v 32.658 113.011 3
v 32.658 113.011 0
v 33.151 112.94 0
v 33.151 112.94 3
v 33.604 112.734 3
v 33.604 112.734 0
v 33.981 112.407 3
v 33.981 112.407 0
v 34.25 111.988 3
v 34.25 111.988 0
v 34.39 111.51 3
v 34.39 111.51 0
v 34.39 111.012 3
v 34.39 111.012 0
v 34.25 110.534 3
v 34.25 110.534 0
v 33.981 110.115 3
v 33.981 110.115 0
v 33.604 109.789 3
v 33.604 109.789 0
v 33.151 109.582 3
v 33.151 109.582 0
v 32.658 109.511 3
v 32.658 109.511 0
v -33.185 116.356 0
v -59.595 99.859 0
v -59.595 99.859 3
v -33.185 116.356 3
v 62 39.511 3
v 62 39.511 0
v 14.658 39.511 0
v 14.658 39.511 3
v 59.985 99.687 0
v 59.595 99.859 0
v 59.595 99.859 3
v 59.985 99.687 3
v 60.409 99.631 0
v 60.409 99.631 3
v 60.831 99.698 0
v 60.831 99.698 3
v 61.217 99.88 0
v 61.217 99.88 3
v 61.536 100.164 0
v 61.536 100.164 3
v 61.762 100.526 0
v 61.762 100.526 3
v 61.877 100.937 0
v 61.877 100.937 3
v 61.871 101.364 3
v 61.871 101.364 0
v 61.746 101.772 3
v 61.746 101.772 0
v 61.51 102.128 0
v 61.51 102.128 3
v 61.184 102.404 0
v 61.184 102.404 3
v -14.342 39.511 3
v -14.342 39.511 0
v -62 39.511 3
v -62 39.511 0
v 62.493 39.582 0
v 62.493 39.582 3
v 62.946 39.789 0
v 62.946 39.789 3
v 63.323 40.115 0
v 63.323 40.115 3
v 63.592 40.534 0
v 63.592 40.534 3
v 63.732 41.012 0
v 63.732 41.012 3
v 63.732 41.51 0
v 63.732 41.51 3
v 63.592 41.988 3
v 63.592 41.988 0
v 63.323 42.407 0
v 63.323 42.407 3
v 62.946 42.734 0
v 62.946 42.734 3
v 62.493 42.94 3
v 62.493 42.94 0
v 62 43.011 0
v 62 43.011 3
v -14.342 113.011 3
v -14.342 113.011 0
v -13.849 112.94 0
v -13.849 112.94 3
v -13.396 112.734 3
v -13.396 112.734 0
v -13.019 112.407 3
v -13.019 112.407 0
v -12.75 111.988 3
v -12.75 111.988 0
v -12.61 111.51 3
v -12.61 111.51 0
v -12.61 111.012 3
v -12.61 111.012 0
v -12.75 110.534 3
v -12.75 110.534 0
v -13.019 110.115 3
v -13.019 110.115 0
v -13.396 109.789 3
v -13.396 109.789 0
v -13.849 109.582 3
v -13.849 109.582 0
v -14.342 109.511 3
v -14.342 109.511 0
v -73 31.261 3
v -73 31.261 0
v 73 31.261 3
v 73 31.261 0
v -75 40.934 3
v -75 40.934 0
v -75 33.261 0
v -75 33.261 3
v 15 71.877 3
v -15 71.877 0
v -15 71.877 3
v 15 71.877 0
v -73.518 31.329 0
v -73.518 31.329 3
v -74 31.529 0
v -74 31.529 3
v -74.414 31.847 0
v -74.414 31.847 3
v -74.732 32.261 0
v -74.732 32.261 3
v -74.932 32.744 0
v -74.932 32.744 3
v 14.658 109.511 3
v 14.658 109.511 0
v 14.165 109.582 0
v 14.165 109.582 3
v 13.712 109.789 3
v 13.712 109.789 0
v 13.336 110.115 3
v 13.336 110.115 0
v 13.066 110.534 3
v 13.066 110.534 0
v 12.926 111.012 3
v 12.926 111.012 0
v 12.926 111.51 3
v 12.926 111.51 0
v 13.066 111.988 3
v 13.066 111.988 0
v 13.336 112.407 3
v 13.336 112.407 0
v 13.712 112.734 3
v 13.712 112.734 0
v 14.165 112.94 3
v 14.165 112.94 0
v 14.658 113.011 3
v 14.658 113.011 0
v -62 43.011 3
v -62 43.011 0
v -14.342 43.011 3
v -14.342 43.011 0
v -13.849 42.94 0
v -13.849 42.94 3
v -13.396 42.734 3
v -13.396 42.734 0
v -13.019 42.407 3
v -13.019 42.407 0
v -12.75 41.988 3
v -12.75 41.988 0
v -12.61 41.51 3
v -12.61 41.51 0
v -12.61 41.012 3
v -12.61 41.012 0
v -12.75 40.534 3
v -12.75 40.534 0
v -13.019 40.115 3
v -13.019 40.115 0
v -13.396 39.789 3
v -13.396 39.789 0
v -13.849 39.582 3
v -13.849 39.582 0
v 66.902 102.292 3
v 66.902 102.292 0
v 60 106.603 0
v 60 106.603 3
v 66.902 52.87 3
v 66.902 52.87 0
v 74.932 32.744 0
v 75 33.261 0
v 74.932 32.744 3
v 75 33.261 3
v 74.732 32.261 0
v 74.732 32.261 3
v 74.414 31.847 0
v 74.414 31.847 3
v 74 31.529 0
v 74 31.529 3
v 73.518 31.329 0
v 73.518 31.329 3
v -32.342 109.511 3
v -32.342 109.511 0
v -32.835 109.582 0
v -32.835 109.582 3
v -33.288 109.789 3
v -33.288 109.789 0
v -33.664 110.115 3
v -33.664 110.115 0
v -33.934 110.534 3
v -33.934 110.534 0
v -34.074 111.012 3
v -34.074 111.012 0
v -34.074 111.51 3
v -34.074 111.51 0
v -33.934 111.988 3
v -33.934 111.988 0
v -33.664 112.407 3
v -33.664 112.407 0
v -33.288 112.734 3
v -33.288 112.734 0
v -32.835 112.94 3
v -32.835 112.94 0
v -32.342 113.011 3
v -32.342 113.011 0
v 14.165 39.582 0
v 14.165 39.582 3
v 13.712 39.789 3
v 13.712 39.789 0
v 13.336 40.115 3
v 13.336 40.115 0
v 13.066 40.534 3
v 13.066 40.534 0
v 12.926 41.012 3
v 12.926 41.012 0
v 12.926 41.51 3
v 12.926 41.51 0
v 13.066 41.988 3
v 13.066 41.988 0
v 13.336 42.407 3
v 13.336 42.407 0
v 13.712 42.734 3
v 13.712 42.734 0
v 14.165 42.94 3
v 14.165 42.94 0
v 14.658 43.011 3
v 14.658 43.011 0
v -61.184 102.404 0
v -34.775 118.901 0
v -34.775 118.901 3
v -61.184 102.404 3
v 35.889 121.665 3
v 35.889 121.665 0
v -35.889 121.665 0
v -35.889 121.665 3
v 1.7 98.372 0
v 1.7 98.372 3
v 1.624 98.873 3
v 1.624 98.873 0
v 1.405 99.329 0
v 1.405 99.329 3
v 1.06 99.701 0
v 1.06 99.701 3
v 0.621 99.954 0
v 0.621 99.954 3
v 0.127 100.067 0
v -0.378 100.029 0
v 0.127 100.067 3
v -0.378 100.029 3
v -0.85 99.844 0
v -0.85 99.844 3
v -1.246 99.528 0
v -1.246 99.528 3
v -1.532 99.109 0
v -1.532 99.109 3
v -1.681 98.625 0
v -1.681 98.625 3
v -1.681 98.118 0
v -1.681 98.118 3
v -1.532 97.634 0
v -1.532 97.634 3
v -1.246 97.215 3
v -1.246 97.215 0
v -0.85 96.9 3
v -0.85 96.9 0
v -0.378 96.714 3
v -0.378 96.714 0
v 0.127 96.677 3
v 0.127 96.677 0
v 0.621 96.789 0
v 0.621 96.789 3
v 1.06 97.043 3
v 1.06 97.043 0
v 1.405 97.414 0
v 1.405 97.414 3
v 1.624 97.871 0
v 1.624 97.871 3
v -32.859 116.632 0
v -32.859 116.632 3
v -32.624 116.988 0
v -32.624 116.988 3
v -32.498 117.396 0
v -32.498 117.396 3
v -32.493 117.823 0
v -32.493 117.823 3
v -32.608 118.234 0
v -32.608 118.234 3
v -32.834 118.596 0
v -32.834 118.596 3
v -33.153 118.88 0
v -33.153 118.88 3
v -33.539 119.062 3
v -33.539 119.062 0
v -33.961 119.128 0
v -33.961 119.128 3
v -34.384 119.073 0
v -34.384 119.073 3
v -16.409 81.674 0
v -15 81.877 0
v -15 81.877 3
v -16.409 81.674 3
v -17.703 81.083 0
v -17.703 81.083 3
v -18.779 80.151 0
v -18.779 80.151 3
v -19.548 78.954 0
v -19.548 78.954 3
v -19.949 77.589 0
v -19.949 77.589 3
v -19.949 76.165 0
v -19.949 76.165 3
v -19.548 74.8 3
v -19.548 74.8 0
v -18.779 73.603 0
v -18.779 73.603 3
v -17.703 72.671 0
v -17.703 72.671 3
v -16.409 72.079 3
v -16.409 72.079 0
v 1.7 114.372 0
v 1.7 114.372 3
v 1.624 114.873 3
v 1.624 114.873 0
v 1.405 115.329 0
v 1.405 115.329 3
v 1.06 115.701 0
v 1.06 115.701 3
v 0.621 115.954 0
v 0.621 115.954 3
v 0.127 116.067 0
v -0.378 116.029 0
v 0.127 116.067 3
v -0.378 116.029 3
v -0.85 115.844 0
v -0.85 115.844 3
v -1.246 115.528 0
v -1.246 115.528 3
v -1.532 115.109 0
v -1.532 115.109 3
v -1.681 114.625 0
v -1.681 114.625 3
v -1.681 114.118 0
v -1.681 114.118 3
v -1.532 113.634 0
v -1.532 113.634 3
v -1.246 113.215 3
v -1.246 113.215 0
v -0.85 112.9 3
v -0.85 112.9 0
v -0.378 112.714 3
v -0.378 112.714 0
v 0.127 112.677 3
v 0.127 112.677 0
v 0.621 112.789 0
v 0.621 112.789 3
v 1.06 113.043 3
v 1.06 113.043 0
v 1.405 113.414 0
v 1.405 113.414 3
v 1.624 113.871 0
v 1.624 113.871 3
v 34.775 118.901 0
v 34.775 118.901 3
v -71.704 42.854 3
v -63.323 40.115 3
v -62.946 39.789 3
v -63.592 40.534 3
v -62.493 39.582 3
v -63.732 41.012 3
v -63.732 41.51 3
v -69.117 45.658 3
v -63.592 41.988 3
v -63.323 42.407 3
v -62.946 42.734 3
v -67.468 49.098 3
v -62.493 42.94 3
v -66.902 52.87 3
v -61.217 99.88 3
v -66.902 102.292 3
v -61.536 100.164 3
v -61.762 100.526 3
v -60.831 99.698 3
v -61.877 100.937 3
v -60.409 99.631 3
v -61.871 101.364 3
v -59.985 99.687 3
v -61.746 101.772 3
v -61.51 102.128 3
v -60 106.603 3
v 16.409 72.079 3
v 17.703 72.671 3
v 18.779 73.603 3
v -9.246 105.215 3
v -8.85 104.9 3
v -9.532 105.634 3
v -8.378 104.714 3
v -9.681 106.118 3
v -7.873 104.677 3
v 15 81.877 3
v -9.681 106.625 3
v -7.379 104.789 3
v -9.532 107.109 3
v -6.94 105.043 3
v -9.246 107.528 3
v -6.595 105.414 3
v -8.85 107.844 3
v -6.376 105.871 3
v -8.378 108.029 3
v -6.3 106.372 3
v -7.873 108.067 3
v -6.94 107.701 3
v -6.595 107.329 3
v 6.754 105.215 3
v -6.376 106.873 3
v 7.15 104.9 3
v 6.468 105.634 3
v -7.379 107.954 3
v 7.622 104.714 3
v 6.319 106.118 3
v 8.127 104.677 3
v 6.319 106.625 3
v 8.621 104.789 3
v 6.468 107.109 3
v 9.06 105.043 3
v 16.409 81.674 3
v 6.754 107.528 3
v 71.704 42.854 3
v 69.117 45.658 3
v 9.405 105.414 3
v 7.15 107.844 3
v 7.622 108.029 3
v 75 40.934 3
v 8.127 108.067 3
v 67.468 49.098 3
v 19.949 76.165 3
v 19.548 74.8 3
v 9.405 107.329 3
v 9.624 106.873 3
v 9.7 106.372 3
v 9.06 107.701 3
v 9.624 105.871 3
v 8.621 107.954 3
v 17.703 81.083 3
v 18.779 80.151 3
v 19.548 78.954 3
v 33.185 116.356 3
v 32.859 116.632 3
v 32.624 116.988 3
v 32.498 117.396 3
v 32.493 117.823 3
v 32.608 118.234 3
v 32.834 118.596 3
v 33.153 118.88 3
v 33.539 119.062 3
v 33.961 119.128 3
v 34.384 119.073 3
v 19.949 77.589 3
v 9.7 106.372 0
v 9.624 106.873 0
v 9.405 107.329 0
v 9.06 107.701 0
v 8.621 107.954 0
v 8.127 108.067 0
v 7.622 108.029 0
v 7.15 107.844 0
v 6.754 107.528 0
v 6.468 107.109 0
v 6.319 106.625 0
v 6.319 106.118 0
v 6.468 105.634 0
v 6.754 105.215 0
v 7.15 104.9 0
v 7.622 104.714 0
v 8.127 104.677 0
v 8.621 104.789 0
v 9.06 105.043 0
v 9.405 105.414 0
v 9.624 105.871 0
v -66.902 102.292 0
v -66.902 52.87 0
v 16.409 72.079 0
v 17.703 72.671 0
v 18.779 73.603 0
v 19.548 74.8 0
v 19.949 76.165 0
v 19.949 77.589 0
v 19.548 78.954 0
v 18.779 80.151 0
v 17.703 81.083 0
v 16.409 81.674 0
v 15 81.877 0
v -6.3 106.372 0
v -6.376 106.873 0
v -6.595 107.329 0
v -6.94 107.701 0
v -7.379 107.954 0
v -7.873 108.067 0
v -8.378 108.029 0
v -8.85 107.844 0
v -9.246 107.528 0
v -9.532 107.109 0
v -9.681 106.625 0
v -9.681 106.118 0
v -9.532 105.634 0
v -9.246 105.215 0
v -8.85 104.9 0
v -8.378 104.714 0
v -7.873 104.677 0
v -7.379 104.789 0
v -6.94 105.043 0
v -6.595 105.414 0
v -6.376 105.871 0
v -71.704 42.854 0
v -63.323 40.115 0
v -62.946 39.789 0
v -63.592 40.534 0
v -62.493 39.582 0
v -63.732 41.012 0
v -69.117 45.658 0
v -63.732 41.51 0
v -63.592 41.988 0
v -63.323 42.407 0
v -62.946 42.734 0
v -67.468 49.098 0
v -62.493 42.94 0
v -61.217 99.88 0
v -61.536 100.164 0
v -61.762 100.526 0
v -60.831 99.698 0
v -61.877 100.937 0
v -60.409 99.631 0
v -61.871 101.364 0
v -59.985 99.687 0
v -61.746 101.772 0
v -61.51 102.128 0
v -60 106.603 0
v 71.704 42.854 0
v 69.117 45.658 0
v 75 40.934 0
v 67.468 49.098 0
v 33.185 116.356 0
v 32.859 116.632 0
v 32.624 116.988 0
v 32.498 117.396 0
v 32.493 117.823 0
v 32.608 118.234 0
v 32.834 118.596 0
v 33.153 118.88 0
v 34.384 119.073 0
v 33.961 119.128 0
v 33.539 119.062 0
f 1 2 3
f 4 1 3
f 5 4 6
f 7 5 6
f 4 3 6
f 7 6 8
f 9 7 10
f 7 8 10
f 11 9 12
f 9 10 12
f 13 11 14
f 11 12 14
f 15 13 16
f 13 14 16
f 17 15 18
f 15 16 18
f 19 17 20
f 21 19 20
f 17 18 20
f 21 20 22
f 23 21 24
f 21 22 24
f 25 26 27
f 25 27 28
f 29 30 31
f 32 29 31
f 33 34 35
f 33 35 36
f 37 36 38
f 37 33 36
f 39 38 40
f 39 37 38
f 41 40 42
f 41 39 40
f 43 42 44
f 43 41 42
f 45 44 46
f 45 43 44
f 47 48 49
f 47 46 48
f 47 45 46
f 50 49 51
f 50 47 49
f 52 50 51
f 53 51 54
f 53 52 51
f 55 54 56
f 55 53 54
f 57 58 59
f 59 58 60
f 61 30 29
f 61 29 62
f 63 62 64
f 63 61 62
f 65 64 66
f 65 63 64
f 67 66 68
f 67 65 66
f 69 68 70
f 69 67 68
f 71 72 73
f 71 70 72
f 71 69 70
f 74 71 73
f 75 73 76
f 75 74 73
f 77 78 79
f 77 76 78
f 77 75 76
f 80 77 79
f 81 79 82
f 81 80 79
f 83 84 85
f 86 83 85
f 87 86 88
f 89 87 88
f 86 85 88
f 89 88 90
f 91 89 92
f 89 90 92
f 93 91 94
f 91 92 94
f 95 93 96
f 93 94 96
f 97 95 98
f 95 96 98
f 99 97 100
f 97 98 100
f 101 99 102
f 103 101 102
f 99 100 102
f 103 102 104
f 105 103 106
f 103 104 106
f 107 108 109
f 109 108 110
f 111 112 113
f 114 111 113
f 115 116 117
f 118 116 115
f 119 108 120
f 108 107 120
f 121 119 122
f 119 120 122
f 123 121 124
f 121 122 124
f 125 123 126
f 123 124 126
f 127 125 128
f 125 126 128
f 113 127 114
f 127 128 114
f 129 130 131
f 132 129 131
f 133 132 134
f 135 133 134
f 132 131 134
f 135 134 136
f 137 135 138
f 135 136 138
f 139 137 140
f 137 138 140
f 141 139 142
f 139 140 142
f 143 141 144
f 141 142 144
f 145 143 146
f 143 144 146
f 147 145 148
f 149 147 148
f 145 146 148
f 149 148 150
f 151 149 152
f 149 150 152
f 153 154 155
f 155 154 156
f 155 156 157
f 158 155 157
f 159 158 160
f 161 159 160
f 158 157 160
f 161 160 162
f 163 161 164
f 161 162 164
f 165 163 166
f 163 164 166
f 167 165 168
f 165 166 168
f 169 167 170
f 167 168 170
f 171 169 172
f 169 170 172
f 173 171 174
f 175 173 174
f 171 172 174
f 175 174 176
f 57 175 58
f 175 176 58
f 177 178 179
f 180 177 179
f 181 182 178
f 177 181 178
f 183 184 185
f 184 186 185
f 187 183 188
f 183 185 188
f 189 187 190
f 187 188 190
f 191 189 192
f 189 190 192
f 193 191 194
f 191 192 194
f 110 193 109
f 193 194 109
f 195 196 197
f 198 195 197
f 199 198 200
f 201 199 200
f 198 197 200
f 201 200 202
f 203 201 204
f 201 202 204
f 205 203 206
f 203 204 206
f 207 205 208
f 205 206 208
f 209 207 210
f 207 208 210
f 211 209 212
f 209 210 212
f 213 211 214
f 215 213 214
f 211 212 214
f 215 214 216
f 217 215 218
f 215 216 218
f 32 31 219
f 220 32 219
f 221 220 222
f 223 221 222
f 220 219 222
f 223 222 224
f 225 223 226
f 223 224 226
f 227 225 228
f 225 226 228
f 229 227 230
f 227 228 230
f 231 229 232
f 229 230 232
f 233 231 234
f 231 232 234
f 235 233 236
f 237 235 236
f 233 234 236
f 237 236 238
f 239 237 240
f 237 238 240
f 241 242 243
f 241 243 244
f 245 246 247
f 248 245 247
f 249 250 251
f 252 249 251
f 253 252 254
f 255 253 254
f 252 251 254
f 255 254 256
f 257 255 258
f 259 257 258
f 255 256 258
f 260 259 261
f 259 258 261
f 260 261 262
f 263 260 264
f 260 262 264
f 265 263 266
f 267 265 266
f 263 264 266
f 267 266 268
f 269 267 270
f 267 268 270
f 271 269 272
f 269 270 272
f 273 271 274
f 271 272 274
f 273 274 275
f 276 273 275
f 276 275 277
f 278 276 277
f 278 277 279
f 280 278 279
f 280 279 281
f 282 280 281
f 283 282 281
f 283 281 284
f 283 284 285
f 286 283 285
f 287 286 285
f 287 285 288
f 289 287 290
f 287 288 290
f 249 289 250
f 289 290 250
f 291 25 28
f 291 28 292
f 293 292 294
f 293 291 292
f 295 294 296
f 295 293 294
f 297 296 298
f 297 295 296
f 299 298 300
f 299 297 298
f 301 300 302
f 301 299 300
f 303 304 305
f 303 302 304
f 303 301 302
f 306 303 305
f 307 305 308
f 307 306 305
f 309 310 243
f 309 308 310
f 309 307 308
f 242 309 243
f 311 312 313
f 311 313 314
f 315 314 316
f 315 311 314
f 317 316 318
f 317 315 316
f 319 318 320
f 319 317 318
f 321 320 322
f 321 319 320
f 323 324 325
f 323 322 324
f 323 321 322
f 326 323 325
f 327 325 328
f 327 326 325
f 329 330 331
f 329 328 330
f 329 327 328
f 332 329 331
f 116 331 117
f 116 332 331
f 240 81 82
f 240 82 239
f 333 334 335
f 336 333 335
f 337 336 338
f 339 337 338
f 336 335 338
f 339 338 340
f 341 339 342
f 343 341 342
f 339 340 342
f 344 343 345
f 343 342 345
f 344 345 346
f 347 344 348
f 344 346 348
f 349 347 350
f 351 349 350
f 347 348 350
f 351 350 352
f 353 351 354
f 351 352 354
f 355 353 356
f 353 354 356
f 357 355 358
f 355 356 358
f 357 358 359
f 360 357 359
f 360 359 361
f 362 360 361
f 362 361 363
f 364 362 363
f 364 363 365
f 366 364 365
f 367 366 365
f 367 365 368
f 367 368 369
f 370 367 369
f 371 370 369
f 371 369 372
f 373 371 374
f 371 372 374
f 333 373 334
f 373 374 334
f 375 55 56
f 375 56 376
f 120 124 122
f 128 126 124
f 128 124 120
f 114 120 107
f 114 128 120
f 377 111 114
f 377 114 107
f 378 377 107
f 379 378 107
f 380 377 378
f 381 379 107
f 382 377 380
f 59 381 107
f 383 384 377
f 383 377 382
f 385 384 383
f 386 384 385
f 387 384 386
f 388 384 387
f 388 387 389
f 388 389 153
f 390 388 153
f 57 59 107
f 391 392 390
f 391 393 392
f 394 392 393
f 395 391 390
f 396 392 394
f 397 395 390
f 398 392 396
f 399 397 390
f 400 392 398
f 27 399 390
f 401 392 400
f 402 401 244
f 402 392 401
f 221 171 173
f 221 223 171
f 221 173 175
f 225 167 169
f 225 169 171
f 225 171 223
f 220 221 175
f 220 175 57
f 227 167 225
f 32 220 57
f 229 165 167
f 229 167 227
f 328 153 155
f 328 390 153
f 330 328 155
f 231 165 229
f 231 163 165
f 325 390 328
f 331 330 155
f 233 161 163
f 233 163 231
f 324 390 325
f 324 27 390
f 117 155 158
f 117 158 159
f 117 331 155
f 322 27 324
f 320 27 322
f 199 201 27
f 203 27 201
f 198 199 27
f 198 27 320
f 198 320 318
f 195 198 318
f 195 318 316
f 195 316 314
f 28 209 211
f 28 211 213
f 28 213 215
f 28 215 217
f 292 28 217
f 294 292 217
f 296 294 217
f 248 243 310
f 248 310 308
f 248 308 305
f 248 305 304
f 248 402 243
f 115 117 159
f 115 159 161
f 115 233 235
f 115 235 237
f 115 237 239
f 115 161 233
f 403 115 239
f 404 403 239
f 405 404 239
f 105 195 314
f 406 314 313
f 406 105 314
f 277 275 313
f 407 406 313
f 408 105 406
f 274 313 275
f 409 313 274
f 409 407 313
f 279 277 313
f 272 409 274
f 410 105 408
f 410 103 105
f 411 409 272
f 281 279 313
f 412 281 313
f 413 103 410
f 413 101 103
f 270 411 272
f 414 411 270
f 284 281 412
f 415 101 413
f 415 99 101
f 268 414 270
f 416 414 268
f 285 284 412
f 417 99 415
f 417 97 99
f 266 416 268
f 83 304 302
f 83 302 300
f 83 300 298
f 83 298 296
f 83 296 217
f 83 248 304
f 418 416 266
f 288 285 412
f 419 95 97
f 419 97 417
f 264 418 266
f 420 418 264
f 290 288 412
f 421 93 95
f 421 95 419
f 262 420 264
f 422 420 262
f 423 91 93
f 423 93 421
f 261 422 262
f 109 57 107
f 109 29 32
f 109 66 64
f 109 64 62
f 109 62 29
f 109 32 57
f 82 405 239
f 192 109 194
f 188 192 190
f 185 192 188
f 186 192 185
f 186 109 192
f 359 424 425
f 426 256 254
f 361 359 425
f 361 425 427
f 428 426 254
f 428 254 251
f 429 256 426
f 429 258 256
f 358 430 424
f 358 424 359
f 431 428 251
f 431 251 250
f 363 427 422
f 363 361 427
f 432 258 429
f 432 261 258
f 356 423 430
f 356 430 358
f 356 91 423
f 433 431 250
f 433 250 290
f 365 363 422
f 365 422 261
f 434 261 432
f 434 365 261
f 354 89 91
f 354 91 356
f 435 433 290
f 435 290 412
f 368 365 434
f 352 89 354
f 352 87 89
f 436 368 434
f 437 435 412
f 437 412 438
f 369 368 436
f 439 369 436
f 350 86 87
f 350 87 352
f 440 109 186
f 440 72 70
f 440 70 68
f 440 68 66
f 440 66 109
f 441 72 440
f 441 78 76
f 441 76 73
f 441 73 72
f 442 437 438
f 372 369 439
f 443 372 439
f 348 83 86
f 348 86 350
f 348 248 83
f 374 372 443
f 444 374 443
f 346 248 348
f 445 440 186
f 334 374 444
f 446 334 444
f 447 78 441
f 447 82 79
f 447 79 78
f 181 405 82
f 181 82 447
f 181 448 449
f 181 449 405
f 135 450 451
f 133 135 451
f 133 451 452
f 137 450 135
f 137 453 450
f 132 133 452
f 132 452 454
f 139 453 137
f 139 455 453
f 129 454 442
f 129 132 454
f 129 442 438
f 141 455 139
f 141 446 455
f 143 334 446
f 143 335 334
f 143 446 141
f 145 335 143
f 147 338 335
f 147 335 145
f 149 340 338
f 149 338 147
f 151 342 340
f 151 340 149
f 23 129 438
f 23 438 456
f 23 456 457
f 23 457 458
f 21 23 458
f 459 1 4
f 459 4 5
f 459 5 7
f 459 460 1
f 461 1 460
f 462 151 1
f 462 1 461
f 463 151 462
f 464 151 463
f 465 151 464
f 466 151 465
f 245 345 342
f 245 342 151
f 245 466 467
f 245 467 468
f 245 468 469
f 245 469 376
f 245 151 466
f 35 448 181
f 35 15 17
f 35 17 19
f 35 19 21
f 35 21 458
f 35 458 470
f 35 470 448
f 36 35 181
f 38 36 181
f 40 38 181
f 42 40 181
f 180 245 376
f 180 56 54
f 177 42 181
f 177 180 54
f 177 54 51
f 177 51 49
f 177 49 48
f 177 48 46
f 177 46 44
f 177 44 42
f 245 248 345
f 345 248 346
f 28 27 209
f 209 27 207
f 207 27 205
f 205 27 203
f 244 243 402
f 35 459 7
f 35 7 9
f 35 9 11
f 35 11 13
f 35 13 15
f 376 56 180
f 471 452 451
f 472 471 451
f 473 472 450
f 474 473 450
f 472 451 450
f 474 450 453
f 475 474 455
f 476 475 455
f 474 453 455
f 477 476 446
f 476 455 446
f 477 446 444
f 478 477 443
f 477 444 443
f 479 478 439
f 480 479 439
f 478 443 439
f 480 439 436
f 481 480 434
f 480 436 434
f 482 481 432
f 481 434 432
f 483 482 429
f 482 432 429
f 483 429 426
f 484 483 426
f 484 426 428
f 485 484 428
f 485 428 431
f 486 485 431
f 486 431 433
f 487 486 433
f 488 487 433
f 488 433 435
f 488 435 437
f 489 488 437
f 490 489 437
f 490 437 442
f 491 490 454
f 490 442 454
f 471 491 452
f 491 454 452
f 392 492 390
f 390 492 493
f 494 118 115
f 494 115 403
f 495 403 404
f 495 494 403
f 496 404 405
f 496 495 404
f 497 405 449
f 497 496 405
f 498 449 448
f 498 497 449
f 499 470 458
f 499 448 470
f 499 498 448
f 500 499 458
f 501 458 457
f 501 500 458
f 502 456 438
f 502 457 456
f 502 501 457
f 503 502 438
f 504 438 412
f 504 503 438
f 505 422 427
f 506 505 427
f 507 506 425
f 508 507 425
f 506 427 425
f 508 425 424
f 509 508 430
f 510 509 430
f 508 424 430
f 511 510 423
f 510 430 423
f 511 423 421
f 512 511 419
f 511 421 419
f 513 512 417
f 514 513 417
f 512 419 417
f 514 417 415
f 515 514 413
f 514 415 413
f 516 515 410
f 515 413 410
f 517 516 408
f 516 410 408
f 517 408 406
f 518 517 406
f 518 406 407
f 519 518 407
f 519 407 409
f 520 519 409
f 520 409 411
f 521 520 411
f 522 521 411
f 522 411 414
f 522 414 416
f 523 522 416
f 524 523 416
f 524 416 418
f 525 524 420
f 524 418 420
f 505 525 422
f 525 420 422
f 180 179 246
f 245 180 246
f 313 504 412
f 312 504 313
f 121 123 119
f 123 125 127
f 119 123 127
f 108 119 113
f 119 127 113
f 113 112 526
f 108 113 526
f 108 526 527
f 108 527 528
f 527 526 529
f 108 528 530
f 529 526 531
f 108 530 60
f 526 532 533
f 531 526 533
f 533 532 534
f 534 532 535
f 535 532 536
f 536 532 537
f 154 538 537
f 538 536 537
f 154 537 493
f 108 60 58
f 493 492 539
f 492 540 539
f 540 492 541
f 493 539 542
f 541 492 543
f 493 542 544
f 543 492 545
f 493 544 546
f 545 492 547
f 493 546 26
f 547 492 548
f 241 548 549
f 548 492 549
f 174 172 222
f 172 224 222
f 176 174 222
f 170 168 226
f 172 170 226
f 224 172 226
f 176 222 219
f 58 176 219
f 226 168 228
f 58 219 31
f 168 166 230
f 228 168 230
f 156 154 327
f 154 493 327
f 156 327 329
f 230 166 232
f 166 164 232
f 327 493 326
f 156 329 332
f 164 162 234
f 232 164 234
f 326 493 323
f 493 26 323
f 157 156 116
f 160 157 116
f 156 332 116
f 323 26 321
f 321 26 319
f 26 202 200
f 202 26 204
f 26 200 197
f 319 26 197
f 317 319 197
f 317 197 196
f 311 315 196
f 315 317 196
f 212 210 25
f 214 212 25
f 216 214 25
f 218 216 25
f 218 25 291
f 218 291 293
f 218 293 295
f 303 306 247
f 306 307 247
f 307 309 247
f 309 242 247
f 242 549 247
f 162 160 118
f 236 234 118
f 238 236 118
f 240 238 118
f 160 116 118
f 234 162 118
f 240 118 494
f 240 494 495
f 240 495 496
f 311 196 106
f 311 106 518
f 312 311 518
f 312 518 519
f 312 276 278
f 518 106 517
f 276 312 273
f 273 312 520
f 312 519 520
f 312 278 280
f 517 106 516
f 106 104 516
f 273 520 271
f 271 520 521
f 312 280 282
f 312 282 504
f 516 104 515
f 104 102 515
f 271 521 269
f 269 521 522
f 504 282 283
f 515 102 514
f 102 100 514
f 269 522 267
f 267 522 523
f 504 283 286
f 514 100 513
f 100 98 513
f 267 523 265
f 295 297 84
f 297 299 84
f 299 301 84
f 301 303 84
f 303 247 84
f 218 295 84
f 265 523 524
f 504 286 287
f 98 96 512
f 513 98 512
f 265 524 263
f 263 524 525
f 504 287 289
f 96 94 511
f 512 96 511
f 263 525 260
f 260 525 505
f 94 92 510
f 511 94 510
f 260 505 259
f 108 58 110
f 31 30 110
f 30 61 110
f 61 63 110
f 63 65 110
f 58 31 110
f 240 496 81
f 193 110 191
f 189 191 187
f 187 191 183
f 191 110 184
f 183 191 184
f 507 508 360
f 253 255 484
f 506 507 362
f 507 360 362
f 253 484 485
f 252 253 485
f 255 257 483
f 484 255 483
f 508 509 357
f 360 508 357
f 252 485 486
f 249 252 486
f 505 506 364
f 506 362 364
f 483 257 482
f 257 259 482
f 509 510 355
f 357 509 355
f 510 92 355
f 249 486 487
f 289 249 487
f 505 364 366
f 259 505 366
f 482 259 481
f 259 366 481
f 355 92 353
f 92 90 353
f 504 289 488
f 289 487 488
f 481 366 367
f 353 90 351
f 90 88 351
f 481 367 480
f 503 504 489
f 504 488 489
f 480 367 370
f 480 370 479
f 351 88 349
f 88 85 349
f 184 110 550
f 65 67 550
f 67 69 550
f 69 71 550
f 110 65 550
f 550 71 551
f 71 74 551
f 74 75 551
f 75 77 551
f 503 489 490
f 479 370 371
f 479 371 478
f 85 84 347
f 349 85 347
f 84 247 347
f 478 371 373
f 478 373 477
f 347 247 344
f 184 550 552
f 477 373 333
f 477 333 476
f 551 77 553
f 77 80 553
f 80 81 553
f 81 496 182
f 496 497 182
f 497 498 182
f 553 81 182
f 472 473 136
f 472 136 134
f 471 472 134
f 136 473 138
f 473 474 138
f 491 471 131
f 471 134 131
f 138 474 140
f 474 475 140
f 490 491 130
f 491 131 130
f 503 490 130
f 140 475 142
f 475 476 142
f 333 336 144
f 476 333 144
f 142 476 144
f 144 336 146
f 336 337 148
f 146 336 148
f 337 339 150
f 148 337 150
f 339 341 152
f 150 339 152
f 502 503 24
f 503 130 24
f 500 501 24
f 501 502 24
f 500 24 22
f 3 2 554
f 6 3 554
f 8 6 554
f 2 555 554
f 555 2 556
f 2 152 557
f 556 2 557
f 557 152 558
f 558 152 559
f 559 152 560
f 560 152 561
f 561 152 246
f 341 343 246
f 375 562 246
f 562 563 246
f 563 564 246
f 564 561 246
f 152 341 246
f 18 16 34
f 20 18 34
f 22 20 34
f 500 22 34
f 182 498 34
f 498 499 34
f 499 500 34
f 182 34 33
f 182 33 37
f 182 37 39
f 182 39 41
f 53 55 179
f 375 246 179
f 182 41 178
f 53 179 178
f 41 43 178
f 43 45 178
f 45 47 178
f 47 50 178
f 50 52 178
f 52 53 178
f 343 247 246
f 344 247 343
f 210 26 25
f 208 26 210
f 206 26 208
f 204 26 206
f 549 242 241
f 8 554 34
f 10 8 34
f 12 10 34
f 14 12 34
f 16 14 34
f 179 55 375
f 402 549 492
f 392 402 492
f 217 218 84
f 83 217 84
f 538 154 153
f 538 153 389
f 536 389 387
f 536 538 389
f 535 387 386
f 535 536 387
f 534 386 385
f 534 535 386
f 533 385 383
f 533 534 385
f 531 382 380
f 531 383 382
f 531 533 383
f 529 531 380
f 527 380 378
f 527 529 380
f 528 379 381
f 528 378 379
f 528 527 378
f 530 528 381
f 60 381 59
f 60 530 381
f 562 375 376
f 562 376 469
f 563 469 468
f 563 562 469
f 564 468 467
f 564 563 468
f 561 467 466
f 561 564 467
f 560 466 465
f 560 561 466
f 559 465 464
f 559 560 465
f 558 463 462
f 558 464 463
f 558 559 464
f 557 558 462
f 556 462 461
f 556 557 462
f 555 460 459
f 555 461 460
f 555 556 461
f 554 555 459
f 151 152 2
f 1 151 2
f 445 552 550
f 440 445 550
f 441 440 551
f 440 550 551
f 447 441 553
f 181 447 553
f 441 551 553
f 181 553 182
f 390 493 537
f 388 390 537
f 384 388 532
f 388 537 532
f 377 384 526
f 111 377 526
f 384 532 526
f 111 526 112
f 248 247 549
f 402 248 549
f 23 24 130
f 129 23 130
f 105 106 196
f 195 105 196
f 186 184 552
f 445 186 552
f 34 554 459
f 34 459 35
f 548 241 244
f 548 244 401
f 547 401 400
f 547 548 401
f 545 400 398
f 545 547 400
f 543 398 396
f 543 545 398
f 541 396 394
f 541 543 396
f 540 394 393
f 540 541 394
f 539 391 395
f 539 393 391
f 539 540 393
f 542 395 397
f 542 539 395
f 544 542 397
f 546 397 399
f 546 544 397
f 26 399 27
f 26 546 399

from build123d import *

# Parameters (mm, degrees)
EXTRUDE_1_DEPTH      = 3
SKETCH_7_R           = 1.75
SKETCH_7_R_2         = 2.25
CUT_EXTRUDE_2_DEPTH  = 143.955430949
CUT_EXTRUDE_4_DEPTH  = 3
CUT_EXTRUDE_5_DEPTH  = 3
CUT_EXTRUDE_8_DEPTH  = 3
SKETCH_12_R          = 1.7
CUT_EXTRUDE_9_DEPTH  = 3
SKETCH_13_R          = 1.7
CUT_EXTRUDE_11_DEPTH = 3
CUT_EXTRUDE_12_DEPTH = 143.955430949
FILLET_1_R           = 2
FILLET_2_R           = 2
CUT_EXTRUDE_13_DEPTH = 143.955430949
CUT_EXTRUDE_15_DEPTH = 143.955430949
CUT_EXTRUDE_16_DEPTH = 143.955430949
SKETCH_20_W          = 133.80338819
SKETCH_20_H          = 42.989432067
EXTRUDE_2_DEPTH      = 3
SKETCH_21_W          = 129.207272524
SKETCH_21_H          = 38.788932745
EXTRUDE_3_DEPTH      = 3
SKETCH_22_W          = 20.868569364
SKETCH_22_H          = 31.210515244
SKETCH_22_W_2        = 21.053246969
SKETCH_22_H_2        = 30.102449614
EXTRUDE_4_DEPTH      = 3
SKETCH_24_W          = 36.300662223
SKETCH_24_H          = 5.953308604
SKETCH_24_W_2        = 36.591067521
EXTRUDE_5_DEPTH      = 3
CUT_EXTRUDE_17_DEPTH = 143.955430949
CUT_EXTRUDE_19_DEPTH = 143.955430949
CUT_EXTRUDE_20_DEPTH = 143.955430949
CUT_EXTRUDE_21_DEPTH = 143.955430949
CUT_EXTRUDE_22_DEPTH = 143.955430949
CUT_EXTRUDE_23_DEPTH = 3
SKETCH_30_W          = 173.170170175
SKETCH_30_H          = 150.145671893
CUT_EXTRUDE_24_DEPTH = 10


with BuildPart() as part:
    # 草图1 → 凸台-拉伸1 (new body)
    with BuildSketch(Plane.XY):
        with BuildLine():
            Line((60, 106.603296002), (35.889163634, 121.664519159))
            Line((35.889163634, 121.664519159), (-35.889163634, 121.664519159))
            Line((-35.889163634, 121.664519159), (-60, 106.603296002))
            Line((-60, 106.603296002), (-60, 94.801892265))
            Line((-60, 94.801892265), (-45, 94.801892265))
            ThreePointArc((-45, 94.801892265), (-43.762563133, 94.289329132), (-43.25, 93.051892265))
            Line((-43.25, 93.051892265), (-37.75, 93.051892265))
            ThreePointArc((-37.75, 93.051892265), (-37.237436867, 94.289329132), (-36, 94.801892265))
            Line((-36, 94.801892265), (-21, 94.801892265))
            ThreePointArc((-21, 94.801892265), (-19.762563133, 94.289329132), (-19.25, 93.051892265))
            Line((-19.25, 93.051892265), (19.25, 93.051892265))
            ThreePointArc((19.25, 93.051892265), (19.762563133, 94.289329132), (21, 94.801892265))
            Line((21, 94.801892265), (36, 94.801892265))
            ThreePointArc((36, 94.801892265), (37.237436867, 94.289329132), (37.75, 93.051892265))
            Line((37.75, 93.051892265), (43.25, 93.051892265))
            ThreePointArc((43.25, 93.051892265), (43.762563133, 94.289329132), (45, 94.801892265))
            Line((45, 94.801892265), (60, 94.801892265))
            Line((60, 94.801892265), (60, 106.603296002))
        make_face()
        with BuildLine():
            Line((66.901694095, 102.292041372), (60, 106.603296002))
            Line((60, 106.603296002), (60, 94.801892265))
            ThreePointArc((60, 94.801892265), (61.237436867, 94.289329132), (61.75, 93.051892265))
            Line((61.75, 93.051892265), (66.901694095, 93.051892265))
            Line((66.901694095, 93.051892265), (66.901694095, 102.292041372))
        make_face()
        with BuildLine():
            Line((-60, 94.801892265), (-60, 106.603296002))
            Line((-60, 106.603296002), (-66.901694095, 102.292041372))
            Line((-66.901694095, 102.292041372), (-66.901694095, 93.051892265))
            Line((-66.901694095, 93.051892265), (-61.75, 93.051892265))
            ThreePointArc((-61.75, 93.051892265), (-61.237436867, 94.289329132), (-60, 94.801892265))
        make_face()
        with BuildLine():
            Line((66.901694095, 63.051892265), (66.901694095, 93.051892265))
            Line((66.901694095, 93.051892265), (61.75, 93.051892265))
            ThreePointArc((61.75, 93.051892265), (61.237436867, 91.814455398), (60, 91.301892265))
            Line((60, 91.301892265), (60, 64.801892265))
            ThreePointArc((60, 64.801892265), (61.237436867, 64.289329132), (61.75, 63.051892265))
            Line((61.75, 63.051892265), (66.901694095, 63.051892265))
        make_face()
        with BuildLine():
            Line((-61.75, 93.051892265), (-66.901694095, 93.051892265))
            Line((-66.901694095, 93.051892265), (-66.901694095, 63.051892265))
            Line((-66.901694095, 63.051892265), (-61.75, 63.051892265))
            ThreePointArc((-61.75, 63.051892265), (-61.237436867, 64.289329132), (-60, 64.801892265))
            Line((-60, 64.801892265), (-60, 91.301892265))
            ThreePointArc((-60, 91.301892265), (-61.237436867, 91.814455398), (-61.75, 93.051892265))
        make_face()
        with BuildLine():
            Line((66.901694095, 52.870133869), (66.901694095, 63.051892265))
            Line((66.901694095, 63.051892265), (61.75, 63.051892265))
            ThreePointArc((61.75, 63.051892265), (61.237436867, 61.814455398), (60, 61.301892265))
            Line((60, 61.301892265), (60, 31.261343001))
            Line((60, 31.261343001), (75, 31.261343001))
            Line((75, 31.261343001), (75, 40.933889795))
            ThreePointArc((75, 40.933889795), (69.117351927, 45.658052319), (66.901694095, 52.870133869))
        make_face()
        with BuildLine():
            Line((60, 64.801892265), (60, 91.301892265))
            Line((60, 91.301892265), (45, 91.301892265))
            ThreePointArc((45, 91.301892265), (43.762563133, 91.814455398), (43.25, 93.051892265))
            Line((43.25, 93.051892265), (37.75, 93.051892265))
            ThreePointArc((37.75, 93.051892265), (37.237436867, 91.814455398), (36, 91.301892265))
            Line((36, 91.301892265), (21, 91.301892265))
            ThreePointArc((21, 91.301892265), (19.762563133, 91.814455398), (19.25, 93.051892265))
            Line((19.25, 93.051892265), (-19.25, 93.051892265))
            ThreePointArc((-19.25, 93.051892265), (-19.762563133, 91.814455398), (-21, 91.301892265))
            Line((-21, 91.301892265), (-36, 91.301892265))
            ThreePointArc((-36, 91.301892265), (-37.237436867, 91.814455398), (-37.75, 93.051892265))
            Line((-37.75, 93.051892265), (-43.25, 93.051892265))
            ThreePointArc((-43.25, 93.051892265), (-43.762563133, 91.814455398), (-45, 91.301892265))
            Line((-45, 91.301892265), (-60, 91.301892265))
            Line((-60, 91.301892265), (-60, 64.801892265))
            Line((-60, 64.801892265), (-45, 64.801892265))
            ThreePointArc((-45, 64.801892265), (-43.762563133, 64.289329132), (-43.25, 63.051892265))
            Line((-43.25, 63.051892265), (-37.75, 63.051892265))
            ThreePointArc((-37.75, 63.051892265), (-37.237436867, 64.289329132), (-36, 64.801892265))
            Line((-36, 64.801892265), (-21, 64.801892265))
            ThreePointArc((-21, 64.801892265), (-19.762563133, 64.289329132), (-19.25, 63.051892265))
            Line((-19.25, 63.051892265), (19.25, 63.051892265))
            ThreePointArc((19.25, 63.051892265), (19.762563133, 64.289329132), (21, 64.801892265))
            Line((21, 64.801892265), (36, 64.801892265))
            ThreePointArc((36, 64.801892265), (37.237436867, 64.289329132), (37.75, 63.051892265))
            Line((37.75, 63.051892265), (43.25, 63.051892265))
            ThreePointArc((43.25, 63.051892265), (43.762563133, 64.289329132), (45, 64.801892265))
            Line((45, 64.801892265), (60, 64.801892265))
        make_face()
        with BuildLine():
            Line((-61.75, 63.051892265), (-66.901694095, 63.051892265))
            Line((-66.901694095, 63.051892265), (-66.901694095, 52.870133869))
            ThreePointArc((-66.901694095, 52.870133869), (-69.117351927, 45.658052319), (-75, 40.933889795))
            Line((-75, 40.933889795), (-75, 31.261343001))
            Line((-75, 31.261343001), (-60, 31.261343001))
            Line((-60, 31.261343001), (-60, 61.301892265))
            ThreePointArc((-60, 61.301892265), (-61.237436867, 61.814455398), (-61.75, 63.051892265))
        make_face()
        with BuildLine():
            Line((60, 31.261343001), (60, 61.301892265))
            Line((60, 61.301892265), (45, 61.301892265))
            ThreePointArc((45, 61.301892265), (43.762563133, 61.814455398), (43.25, 63.051892265))
            Line((43.25, 63.051892265), (37.75, 63.051892265))
            ThreePointArc((37.75, 63.051892265), (37.237436867, 61.814455398), (36, 61.301892265))
            Line((36, 61.301892265), (21, 61.301892265))
            ThreePointArc((21, 61.301892265), (19.762563133, 61.814455398), (19.25, 63.051892265))
            Line((19.25, 63.051892265), (-19.25, 63.051892265))
            ThreePointArc((-19.25, 63.051892265), (-19.762563133, 61.814455398), (-21, 61.301892265))
            Line((-21, 61.301892265), (-36, 61.301892265))
            ThreePointArc((-36, 61.301892265), (-37.237436867, 61.814455398), (-37.75, 63.051892265))
            Line((-37.75, 63.051892265), (-43.25, 63.051892265))
            ThreePointArc((-43.25, 63.051892265), (-43.762563133, 61.814455398), (-45, 61.301892265))
            Line((-45, 61.301892265), (-60, 61.301892265))
            Line((-60, 61.301892265), (-60, 31.261343001))
            Line((-60, 31.261343001), (60, 31.261343001))
        make_face()
        with BuildLine():
            Line((60, -58.312864289), (60, 23.940028391))
            Line((60, 23.940028391), (-60, 23.940028391))
            Line((-60, 23.940028391), (-60, -58.312864289))
            Line((-60, -58.312864289), (-45, -58.312864289))
            ThreePointArc((-45, -58.312864289), (-43.25, -60.062864289), (-45, -61.812864289))
            Line((-45, -61.812864289), (-60, -61.812864289))
            Line((-60, -61.812864289), (-60, -88.312864289))
            Line((-60, -88.312864289), (-45, -88.312864289))
            ThreePointArc((-45, -88.312864289), (-43.25, -90.062864289), (-45, -91.812864289))
            Line((-45, -91.812864289), (-60, -91.812864289))
            Line((-60, -91.812864289), (-60, -111.849967256))
            Line((-60, -111.849967256), (-38.845469114, -105.590576733))
            ThreePointArc((-38.845469114, -105.590576733), (-36.037784492, -104.975210108), (-33.17088573, -104.768665882))
            Line((-33.17088573, -104.768665882), (33.17088573, -104.768665882))
            ThreePointArc((33.17088573, -104.768665882), (36.037784492, -104.975210108), (38.845469114, -105.590576733))
            Line((38.845469114, -105.590576733), (60, -111.849967256))
            Line((60, -111.849967256), (60, -91.812864289))
            Line((60, -91.812864289), (45, -91.812864289))
            ThreePointArc((45, -91.812864289), (43.762563133, -91.300301156), (43.25, -90.062864289))
            ThreePointArc((43.25, -90.062864289), (43.762563133, -88.825427422), (45, -88.312864289))
            Line((45, -88.312864289), (60, -88.312864289))
            Line((60, -88.312864289), (60, -61.812864289))
            Line((60, -61.812864289), (45, -61.812864289))
            ThreePointArc((45, -61.812864289), (43.762563133, -61.300301156), (43.25, -60.062864289))
            ThreePointArc((43.25, -60.062864289), (43.762563133, -58.825427422), (45, -58.312864289))
            Line((45, -58.312864289), (60, -58.312864289))
        make_face()
        with BuildLine():
            ThreePointArc((-21, -88.312864289), (-19.762563133, -88.825427422), (-19.25, -90.062864289))
            ThreePointArc((-19.25, -90.062864289), (-19.762563133, -91.300301156), (-21, -91.812864289))
            Line((-21, -91.812864289), (-36, -91.812864289))
            ThreePointArc((-36, -91.812864289), (-37.75, -90.062864289), (-36, -88.312864289))
            Line((-36, -88.312864289), (-21, -88.312864289))
        make_face(mode=Mode.SUBTRACT)
        with BuildLine():
            ThreePointArc((-21, -58.312864289), (-19.762563133, -58.825427422), (-19.25, -60.062864289))
            ThreePointArc((-19.25, -60.062864289), (-19.762563133, -61.300301156), (-21, -61.812864289))
            Line((-21, -61.812864289), (-36, -61.812864289))
            ThreePointArc((-36, -61.812864289), (-37.75, -60.062864289), (-36, -58.312864289))
            Line((-36, -58.312864289), (-21, -58.312864289))
        make_face(mode=Mode.SUBTRACT)
        with BuildLine():
            ThreePointArc((36, -88.312864289), (37.237436867, -88.825427422), (37.75, -90.062864289))
            ThreePointArc((37.75, -90.062864289), (37.237436867, -91.300301156), (36, -91.812864289))
            Line((36, -91.812864289), (21, -91.812864289))
            ThreePointArc((21, -91.812864289), (19.762563133, -91.300301156), (19.25, -90.062864289))
            ThreePointArc((19.25, -90.062864289), (19.762563133, -88.825427422), (21, -88.312864289))
            Line((21, -88.312864289), (36, -88.312864289))
        make_face(mode=Mode.SUBTRACT)
        with BuildLine():
            ThreePointArc((36, -58.312864289), (37.237436867, -58.825427422), (37.75, -60.062864289))
            ThreePointArc((37.75, -60.062864289), (37.237436867, -61.300301156), (36, -61.812864289))
            Line((36, -61.812864289), (21, -61.812864289))
            ThreePointArc((21, -61.812864289), (19.762563133, -61.300301156), (19.25, -60.062864289))
            ThreePointArc((19.25, -60.062864289), (19.762563133, -58.825427422), (21, -58.312864289))
            Line((21, -58.312864289), (36, -58.312864289))
        make_face(mode=Mode.SUBTRACT)
        with BuildLine():
            Line((75, 23.940028391), (60, 23.940028391))
            Line((60, 23.940028391), (60, -58.312864289))
            ThreePointArc((60, -58.312864289), (61.237436867, -58.825427422), (61.75, -60.062864289))
            Line((61.75, -60.062864289), (67.402721334, -60.062864289))
            add(Edge.make_bspline(
                [(75, 10.562559835), (72.695878257, 1.907314233), (70.339582535, -13.372796253), (67.818206704, -36.939032951), (67.208860388, -51.77269444), (67.402721334, -60.062864289)],
                knots=[0, 0, 0, 0, 0.235246678, 0.40629419, 0.624108181, 0.624108181, 0.624108181, 0.624108181], degree=3))
            Line((75, 10.562559835), (75, 23.940028391))
        make_face()
        with BuildLine():
            Line((-60, -58.312864289), (-60, 23.940028391))
            Line((-60, 23.940028391), (-75, 23.940028391))
            Line((-75, 23.940028391), (-75, 10.562559835))
            add(Edge.make_bspline(
                [(-75, 10.562559835), (-72.695878257, 1.907314233), (-70.339582535, -13.372796253), (-67.818206704, -36.939032951), (-67.208860388, -51.77269444), (-67.402721334, -60.062864289)],
                knots=[0, 0, 0, 0, 0.235246678, 0.40629419, 0.624108181, 0.624108181, 0.624108181, 0.624108181], degree=3))
            add(Edge.make_bspline(
                [(-67.402721334, -60.062864289), (-67.560325872, -66.802583754), (-68.323504015, -76.843670093), (-70.154131955, -86.778530076), (-70.533712858, -90.062864289)],
                knots=[0.624108181, 0.624108181, 0.624108181, 0.624108181, 0.801186001, 0.888408652, 0.888408652, 0.888408652, 0.888408652], degree=3))
            add(Edge.make_bspline(
                [(-70.533712858, -90.062864289), (-71.019342956, -94.264792095), (-71.137422935, -98.476048206), (-70.1742624, -102.732794059)],
                knots=[0.888408652, 0.888408652, 0.888408652, 0.888408652, 1, 1, 1, 1], degree=3))
            Line((-70.1742624, -102.732794059), (-66.460817635, -113.761651372))
            Line((-66.460817635, -113.761651372), (-60, -111.849967256))
            Line((-60, -111.849967256), (-60, -91.812864289))
            ThreePointArc((-60, -91.812864289), (-61.75, -90.062864289), (-60, -88.312864289))
            Line((-60, -88.312864289), (-60, -61.812864289))
            ThreePointArc((-60, -61.812864289), (-61.75, -60.062864289), (-60, -58.312864289))
        make_face()
        with BuildLine():
            Line((67.402721334, -60.062864289), (61.75, -60.062864289))
            ThreePointArc((61.75, -60.062864289), (61.237436867, -61.300301156), (60, -61.812864289))
            Line((60, -61.812864289), (60, -88.312864289))
            ThreePointArc((60, -88.312864289), (61.237436867, -88.825427422), (61.75, -90.062864289))
            Line((61.75, -90.062864289), (70.533712858, -90.062864289))
            add(Edge.make_bspline(
                [(67.402721334, -60.062864289), (67.560325872, -66.802583754), (68.323504015, -76.843670093), (70.154131955, -86.778530076), (70.533712858, -90.062864289)],
                knots=[0.624108181, 0.624108181, 0.624108181, 0.624108181, 0.801186001, 0.888408652, 0.888408652, 0.888408652, 0.888408652], degree=3))
        make_face()
        with BuildLine():
            add(Edge.make_bspline(
                [(70.533712858, -90.062864289), (71.019342956, -94.264792095), (71.137422935, -98.476048206), (70.1742624, -102.732794059)],
                knots=[0.888408652, 0.888408652, 0.888408652, 0.888408652, 1, 1, 1, 1], degree=3))
            Line((70.533712858, -90.062864289), (61.75, -90.062864289))
            ThreePointArc((61.75, -90.062864289), (61.237436867, -91.300301156), (60, -91.812864289))
            Line((60, -91.812864289), (60, -111.849967256))
            Line((60, -111.849967256), (66.460817635, -113.761651372))
            Line((66.460817635, -113.761651372), (70.1742624, -102.732794059))
        make_face()
    extrude(amount=EXTRUDE_1_DEPTH)

    # 草图7 → 切除-拉伸2 (cut, through all)
    with BuildSketch(Plane(origin=(0, 0, 0), x_dir=(-1, 0, 0), z_dir=(0, 0, -1))):
        with Locations((-21, 41.261343001)):
            Circle(SKETCH_7_R)
        with Locations((21, 41.261343001)):
            Circle(SKETCH_7_R)
        with Locations((-21, 13.940028391)):
            Circle(SKETCH_7_R_2)
        with Locations((21, 13.940028391)):
            Circle(SKETCH_7_R_2)
    extrude(amount=-CUT_EXTRUDE_2_DEPTH, mode=Mode.SUBTRACT)

    # 草图9 → 切除-拉伸4 (cut)
    with BuildSketch(Plane.XY.offset(3)):
        with BuildLine():
            Line((55, -100.49704609), (20, -100.49704609))
            ThreePointArc((20, -100.49704609), (18.25, -98.74704609), (20, -96.99704609))
            Line((20, -96.99704609), (55, -96.99704609))
            ThreePointArc((55, -96.99704609), (56.75, -98.74704609), (55, -100.49704609))
        make_face()
        with BuildLine():
            Line((-55, -96.99704609), (-20, -96.99704609))
            ThreePointArc((-20, -96.99704609), (-18.25, -98.74704609), (-20, -100.49704609))
            Line((-20, -100.49704609), (-55, -100.49704609))
            ThreePointArc((-55, -100.49704609), (-56.75, -98.74704609), (-55, -96.99704609))
        make_face()
    extrude(amount=-CUT_EXTRUDE_4_DEPTH, mode=Mode.SUBTRACT)

    # 草图10 → 切除-拉伸5 (cut)
    with BuildSketch(Plane.XY.offset(3)):
        with BuildLine():
            Line((12.5, -80.062864289), (-12.5, -80.062864289))
            ThreePointArc((-12.5, -80.062864289), (-17.5, -75.062864289), (-12.5, -70.062864289))
            Line((-12.5, -70.062864289), (12.5, -70.062864289))
            ThreePointArc((12.5, -70.062864289), (17.5, -75.062864289), (12.5, -80.062864289))
        make_face()
    extrude(amount=-CUT_EXTRUDE_5_DEPTH, mode=Mode.SUBTRACT)

    # 草图11 → 切除-拉伸8 (cut)
    with BuildSketch(Plane.XY.offset(3)):
        with BuildLine():
            Line((15, 73.051892265), (-15, 73.051892265))
            ThreePointArc((-15, 73.051892265), (-20, 78.051892265), (-15, 83.051892265))
            Line((-15, 83.051892265), (15, 83.051892265))
            ThreePointArc((15, 83.051892265), (20, 78.051892265), (15, 73.051892265))
        make_face()
    extrude(amount=-CUT_EXTRUDE_8_DEPTH, mode=Mode.SUBTRACT)

    # 草图12 → 切除-拉伸9 (cut)
    with BuildSketch(Plane.XY.offset(3)):
        with Locations((0, 114.371786435)):
            Circle(SKETCH_12_R)
        with Locations((0, 98.371786435)):
            Circle(SKETCH_12_R)
        with Locations((8, 106.371786435)):
            Circle(SKETCH_12_R)
        with Locations((-8, 106.371786435)):
            Circle(SKETCH_12_R)
    extrude(amount=-CUT_EXTRUDE_9_DEPTH, mode=Mode.SUBTRACT)

    # 草图13 → 切除-拉伸11 (cut)
    with BuildSketch(Plane.XY.offset(3)):
        with Locations((0, -84.415765086)):
            Circle(SKETCH_13_R)
        with Locations((8, -92.415765086)):
            Circle(SKETCH_13_R)
        with Locations((0, -100.415765086)):
            Circle(SKETCH_13_R)
        with Locations((-8, -92.415765086)):
            Circle(SKETCH_13_R)
    extrude(amount=-CUT_EXTRUDE_11_DEPTH, mode=Mode.SUBTRACT)

    # 草图14 → 切除-拉伸12 (cut, through all)
    with BuildSketch(Plane.XY.offset(3)):
        with BuildLine():
            Line((-55.475501567, 8.919687236), (-55.475501567, -46.080312764))
            ThreePointArc((-55.475501567, -46.080312764), (-57.225501567, -47.830312764), (-58.975501567, -46.080312764))
            Line((-58.975501567, -46.080312764), (-58.975501567, 8.919687236))
            ThreePointArc((-58.975501567, 8.919687236), (-57.225501567, 10.669687236), (-55.475501567, 8.919687236))
        make_face()
        with BuildLine():
            Line((58.975501567, 8.919687236), (58.975501567, -46.080312764))
            ThreePointArc((58.975501567, -46.080312764), (57.225501567, -47.830312764), (55.475501567, -46.080312764))
            Line((55.475501567, -46.080312764), (55.475501567, 8.919687236))
            ThreePointArc((55.475501567, 8.919687236), (57.225501567, 10.669687236), (58.975501567, 8.919687236))
        make_face()
    extrude(amount=-CUT_EXTRUDE_12_DEPTH, mode=Mode.SUBTRACT)

    # 圆角1
    fillet_1_edges = [part.edges().sort_by_distance(p)[0] for p in [
        (75, 31.261343001, 1.5),
        (-75, 31.261343001, 1.5),
    ]]
    fillet(fillet_1_edges, radius=FILLET_1_R)

    # 圆角2
    fillet_2_edges = [part.edges().sort_by_distance(p)[0] for p in [
        (-75, 23.940028391, 1.5),
        (75, 23.940028391, 1.5),
    ]]
    fillet(fillet_2_edges, radius=FILLET_2_R)

    # 草图15 → 切除-拉伸13 (cut, through all)
    with BuildSketch(Plane(origin=(0, 0, 0), x_dir=(-1, 0, 0), z_dir=(0, 0, -1))):
        with BuildLine():
            Line((-61.184216401, 102.403501276), (-34.774762862, 118.900592756))
            ThreePointArc((-34.774762862, 118.900592756), (-32.70788159, 118.423097411), (-33.185376934, 116.356216138))
            Line((-33.185376934, 116.356216138), (-59.594830473, 99.859124658))
            ThreePointArc((-59.594830473, 99.859124658), (-61.661711746, 100.336620003), (-61.184216401, 102.403501276))
        make_face()
        with BuildLine():
            Line((59.594830473, 99.859124658), (33.185376934, 116.356216138))
            ThreePointArc((33.185376934, 116.356216138), (32.70788159, 118.423097411), (34.774762862, 118.900592756))
            Line((34.774762862, 118.900592756), (61.184216401, 102.403501276))
            ThreePointArc((61.184216401, 102.403501276), (61.661711746, 100.336620003), (59.594830473, 99.859124658))
        make_face()
    extrude(amount=-CUT_EXTRUDE_13_DEPTH, mode=Mode.SUBTRACT)

    # 草图17 → 切除-拉伸15 (cut, through all)
    with BuildSketch(Plane(origin=(0, 0, 0), x_dir=(-1, 0, 0), z_dir=(0, 0, -1))):
        Polygon((-28.645414283, -8.118433382), (-34.644957411, -20.11751964), (-34.644957411, -29.946558382), (-37.580904049, -29.946558382), (-37.580904049, -20.11751964), (-43.580447177, -8.118433382), (-40.64450054, -8.118433382), (-36.176755657, -17.43687271), (-36.049105803, -17.43687271), (-31.58136092, -8.118433382), align=None)
    extrude(amount=-CUT_EXTRUDE_15_DEPTH, mode=Mode.SUBTRACT)

    # 草图18 → 切除-拉伸16 (cut, through all)
    with BuildSketch(Plane(origin=(0, 0, 0), x_dir=(-1, 0, 0), z_dir=(0, 0, -1))):
        Polygon((46.06697123, -29.087529791), (43.131024593, -29.087529791), (43.131024593, -18.875541487), (35.854982926, -18.875541487), (35.854982926, -29.087529791), (32.919036289, -29.087529791), (32.919036289, -7.259404791), (35.854982926, -7.259404791), (35.854982926, -16.450194265), (43.131024593, -16.450194265), (43.131024593, -7.259404791), (46.06697123, -7.259404791), align=None)
    extrude(amount=-CUT_EXTRUDE_16_DEPTH, mode=Mode.SUBTRACT)

    # 草图20 → 凸台-拉伸2 (add)
    with BuildSketch(Plane(origin=(0, 0, 0), x_dir=(-1, 0, 0), z_dir=(0, 0, -1))):
        with Locations((0, 74.364849902)):
            Rectangle(SKETCH_20_W, SKETCH_20_H)
    extrude(amount=-EXTRUDE_2_DEPTH)

    # 草图21 → 凸台-拉伸3 (add)
    with BuildSketch(Plane(origin=(0, 0, 0), x_dir=(-1, 0, 0), z_dir=(0, 0, -1))):
        with Locations((-0.162688936, -75.817262983)):
            Rectangle(SKETCH_21_W, SKETCH_21_H)
    extrude(amount=-EXTRUDE_3_DEPTH)

    # 草图22 → 凸台-拉伸4 (add)
    with BuildSketch(Plane(origin=(0, 0, 0), x_dir=(-1, 0, 0), z_dir=(0, 0, -1))):
        with Locations((-36.28455521, -18.718035035)):
            Rectangle(SKETCH_22_W, SKETCH_22_H)
        with Locations((39.340924035, -18.16400222)):
            Rectangle(SKETCH_22_W_2, SKETCH_22_H_2)
    extrude(amount=-EXTRUDE_4_DEPTH)

    # 草图24 → 凸台-拉伸5 (add)
    with BuildSketch(Plane(origin=(0, 0, 0), x_dir=(-1, 0, 0), z_dir=(0, 0, -1))):
        with Locations((-46.84572901, 41.350914957)):
            Rectangle(SKETCH_24_W, SKETCH_24_H)
        with Locations((47.53599277, 41.350914957)):
            Rectangle(SKETCH_24_W_2, SKETCH_24_H)
    extrude(amount=-EXTRUDE_5_DEPTH)

    # 草图25 → 切除-拉伸17 (cut, through all)
    with BuildSketch(Plane(origin=(0, 0, 0), x_dir=(-1, 0, 0), z_dir=(0, 0, -1))):
        with BuildLine():
            Line((-14.658238954, 113.011343001), (-32.658238954, 113.011343001))
            ThreePointArc((-32.658238954, 113.011343001), (-34.408238954, 111.261343001), (-32.658238954, 109.511343001))
            Line((-32.658238954, 109.511343001), (-14.658238954, 109.511343001))
            ThreePointArc((-14.658238954, 109.511343001), (-12.908238954, 111.261343001), (-14.658238954, 113.011343001))
        make_face()
        with BuildLine():
            Line((-20.999999982, 43.011343001), (-32.658238954, 43.011343001))
            ThreePointArc((-32.658238954, 43.011343001), (-34.408238954, 41.261343001), (-32.658238954, 39.511343001))
            Line((-32.658238954, 39.511343001), (-21, 39.511343001))
            ThreePointArc((-21, 39.511343001), (-22.75, 41.26134301), (-20.999999982, 43.011343001))
        make_face()
        with BuildLine():
            ThreePointArc((14.341761046, 113.011343001), (12.591761046, 111.261343001), (14.341761046, 109.511343001))
            Line((14.341761046, 109.511343001), (32.341761046, 109.511343001))
            ThreePointArc((32.341761046, 109.511343001), (34.091761046, 111.261343001), (32.341761046, 113.011343001))
            Line((32.341761046, 113.011343001), (14.341761046, 113.011343001))
        make_face()
        with BuildLine():
            Line((-14.658238954, 43.011343001), (-20.999999982, 43.011343001))
            ThreePointArc((-20.999999982, 43.011343001), (-19.25, 41.261342991), (-21, 39.511343001))
            Line((-21, 39.511343001), (-14.658238954, 39.511343001))
            ThreePointArc((-14.658238954, 39.511343001), (-12.908238954, 41.261343001), (-14.658238954, 43.011343001))
        make_face()
        with BuildLine():
            ThreePointArc((32.341761046, 39.511343001), (34.091761046, 41.261343001), (32.341761046, 43.011343001))
            Line((32.341761046, 43.011343001), (21, 43.011343001))
            ThreePointArc((21, 43.011343001), (22.75, 41.261343001), (21, 39.511343001))
            Line((21, 39.511343001), (32.341761046, 39.511343001))
        make_face()
        with BuildLine():
            ThreePointArc((14.341761046, 43.011343001), (12.591761046, 41.261343001), (14.341761046, 39.511343001))
            Line((14.341761046, 39.511343001), (21, 39.511343001))
            ThreePointArc((21, 39.511343001), (19.25, 41.261343001), (21, 43.011343001))
            Line((21, 43.011343001), (14.341761046, 43.011343001))
        make_face()
    extrude(amount=-CUT_EXTRUDE_17_DEPTH, mode=Mode.SUBTRACT)

    # 草图16 → 切除-拉伸19 (cut, through all)
    with BuildSketch(Plane(origin=(0, 0, 0), x_dir=(-1, 0, 0), z_dir=(0, 0, -1))):
        with BuildLine():
            Line((-62, 43.011343001), (-32, 43.011343001))
            ThreePointArc((-32, 43.011343001), (-30.25, 41.261343001), (-32, 39.511343001))
            Line((-32, 39.511343001), (-62, 39.511343001))
            ThreePointArc((-62, 39.511343001), (-63.75, 41.261343001), (-62, 43.011343001))
        make_face()
        with BuildLine():
            Line((62, 39.511343001), (32, 39.511343001))
            ThreePointArc((32, 39.511343001), (30.25, 41.261343001), (32, 43.011343001))
            Line((32, 43.011343001), (62, 43.011343001))
            ThreePointArc((62, 43.011343001), (63.75, 41.261343001), (62, 39.511343001))
        make_face()
    extrude(amount=-CUT_EXTRUDE_19_DEPTH, mode=Mode.SUBTRACT)

    # 草图26 → 切除-拉伸20 (cut, through all)
    with BuildSketch(Plane(origin=(0, 0, 0), x_dir=(-1, 0, 0), z_dir=(0, 0, -1))):
        with BuildLine():
            Line((15, 71.876956146), (-15, 71.876956146))
            ThreePointArc((-15, 71.876956146), (-20, 76.876956146), (-15, 81.876956146))
            Line((-15, 81.876956146), (15, 81.876956146))
            ThreePointArc((15, 81.876956146), (20, 76.876956146), (15, 71.876956146))
        make_face()
    extrude(amount=-CUT_EXTRUDE_20_DEPTH, mode=Mode.SUBTRACT)

    # 草图27 → 切除-拉伸21 (cut, through all)
    with BuildSketch(Plane(origin=(0, 0, 0), x_dir=(-1, 0, 0), z_dir=(0, 0, -1))):
        with BuildLine():
            Line((-10, -15.809971609), (-42.5, -15.809971609))
            ThreePointArc((-42.5, -15.809971609), (-44.25, -17.559971609), (-42.5, -19.309971609))
            Line((-42.5, -19.309971609), (-10, -19.309971609))
            ThreePointArc((-10, -19.309971609), (-8.25, -17.559971609), (-10, -15.809971609))
        make_face()
        with BuildLine():
            ThreePointArc((-42.5, 7.190028391), (-44.25, 5.440028391), (-42.5, 3.690028391))
            Line((-42.5, 3.690028391), (-10, 3.690028391))
            ThreePointArc((-10, 3.690028391), (-8.25, 5.440028391), (-10, 7.190028391))
            Line((-10, 7.190028391), (-42.5, 7.190028391))
        make_face()
        with BuildLine():
            Line((42.5, -15.809971609), (10, -15.809971609))
            ThreePointArc((10, -15.809971609), (8.25, -17.559971609), (10, -19.309971609))
            Line((10, -19.309971609), (42.5, -19.309971609))
            ThreePointArc((42.5, -19.309971609), (44.25, -17.559971609), (42.5, -15.809971609))
        make_face()
        with BuildLine():
            Line((42.5, 7.190028391), (10, 7.190028391))
            ThreePointArc((10, 7.190028391), (8.25, 5.440028391), (10, 3.690028391))
            Line((10, 3.690028391), (42.5, 3.690028391))
            ThreePointArc((42.5, 3.690028391), (44.25, 5.440028391), (42.5, 7.190028391))
        make_face()
    extrude(amount=-CUT_EXTRUDE_21_DEPTH, mode=Mode.SUBTRACT)

    # 草图28 → 切除-拉伸22 (cut, through all)
    with BuildSketch(Plane(origin=(0, 0, 0), x_dir=(-1, 0, 0), z_dir=(0, 0, -1))):
        with BuildLine():
            ThreePointArc((0, -48.812330529), (-7.86916468, -46.39674179), (-10.284753419, -54.26590647))
            ThreePointArc((-10.284753419, -54.26590647), (-5.977554294, -59.915955393), (0, -63.755729058))
            ThreePointArc((0, -63.755729058), (5.977554294, -59.915955393), (10.284753419, -54.26590647))
            ThreePointArc((10.284753419, -54.26590647), (7.86916468, -46.39674179), (0, -48.812330529))
        make_face()
    extrude(amount=-CUT_EXTRUDE_22_DEPTH, mode=Mode.SUBTRACT)

    # 草图29 → 切除-拉伸23 (cut)
    with BuildSketch(Plane(origin=(0, 0, 0), x_dir=(-1, 0, 0), z_dir=(0, 0, -1))):
        with BuildLine():
            ThreePointArc((-21.368709037, -73.490793052), (0, -84.713248851), (21.368709037, -73.490793052))
            ThreePointArc((21.368709037, -73.490793052), (23.760053677, -73.051240341), (24.199606389, -75.442584981))
            ThreePointArc((24.199606389, -75.442584981), (0, -88.151776376), (-24.199606389, -75.442584981))
            ThreePointArc((-24.199606389, -75.442584981), (-23.760053677, -73.051240341), (-21.368709037, -73.490793052))
        make_face()
    extrude(amount=-CUT_EXTRUDE_23_DEPTH, mode=Mode.SUBTRACT)

    # 草图30 → 切除-拉伸24 (cut)
    with BuildSketch(Plane.XY.offset(3)):
        with Locations((4.215753206, -48.583336833)):
            Rectangle(SKETCH_30_W, SKETCH_30_H)
    extrude(amount=-CUT_EXTRUDE_24_DEPTH, mode=Mode.SUBTRACT)


solid = part.part
